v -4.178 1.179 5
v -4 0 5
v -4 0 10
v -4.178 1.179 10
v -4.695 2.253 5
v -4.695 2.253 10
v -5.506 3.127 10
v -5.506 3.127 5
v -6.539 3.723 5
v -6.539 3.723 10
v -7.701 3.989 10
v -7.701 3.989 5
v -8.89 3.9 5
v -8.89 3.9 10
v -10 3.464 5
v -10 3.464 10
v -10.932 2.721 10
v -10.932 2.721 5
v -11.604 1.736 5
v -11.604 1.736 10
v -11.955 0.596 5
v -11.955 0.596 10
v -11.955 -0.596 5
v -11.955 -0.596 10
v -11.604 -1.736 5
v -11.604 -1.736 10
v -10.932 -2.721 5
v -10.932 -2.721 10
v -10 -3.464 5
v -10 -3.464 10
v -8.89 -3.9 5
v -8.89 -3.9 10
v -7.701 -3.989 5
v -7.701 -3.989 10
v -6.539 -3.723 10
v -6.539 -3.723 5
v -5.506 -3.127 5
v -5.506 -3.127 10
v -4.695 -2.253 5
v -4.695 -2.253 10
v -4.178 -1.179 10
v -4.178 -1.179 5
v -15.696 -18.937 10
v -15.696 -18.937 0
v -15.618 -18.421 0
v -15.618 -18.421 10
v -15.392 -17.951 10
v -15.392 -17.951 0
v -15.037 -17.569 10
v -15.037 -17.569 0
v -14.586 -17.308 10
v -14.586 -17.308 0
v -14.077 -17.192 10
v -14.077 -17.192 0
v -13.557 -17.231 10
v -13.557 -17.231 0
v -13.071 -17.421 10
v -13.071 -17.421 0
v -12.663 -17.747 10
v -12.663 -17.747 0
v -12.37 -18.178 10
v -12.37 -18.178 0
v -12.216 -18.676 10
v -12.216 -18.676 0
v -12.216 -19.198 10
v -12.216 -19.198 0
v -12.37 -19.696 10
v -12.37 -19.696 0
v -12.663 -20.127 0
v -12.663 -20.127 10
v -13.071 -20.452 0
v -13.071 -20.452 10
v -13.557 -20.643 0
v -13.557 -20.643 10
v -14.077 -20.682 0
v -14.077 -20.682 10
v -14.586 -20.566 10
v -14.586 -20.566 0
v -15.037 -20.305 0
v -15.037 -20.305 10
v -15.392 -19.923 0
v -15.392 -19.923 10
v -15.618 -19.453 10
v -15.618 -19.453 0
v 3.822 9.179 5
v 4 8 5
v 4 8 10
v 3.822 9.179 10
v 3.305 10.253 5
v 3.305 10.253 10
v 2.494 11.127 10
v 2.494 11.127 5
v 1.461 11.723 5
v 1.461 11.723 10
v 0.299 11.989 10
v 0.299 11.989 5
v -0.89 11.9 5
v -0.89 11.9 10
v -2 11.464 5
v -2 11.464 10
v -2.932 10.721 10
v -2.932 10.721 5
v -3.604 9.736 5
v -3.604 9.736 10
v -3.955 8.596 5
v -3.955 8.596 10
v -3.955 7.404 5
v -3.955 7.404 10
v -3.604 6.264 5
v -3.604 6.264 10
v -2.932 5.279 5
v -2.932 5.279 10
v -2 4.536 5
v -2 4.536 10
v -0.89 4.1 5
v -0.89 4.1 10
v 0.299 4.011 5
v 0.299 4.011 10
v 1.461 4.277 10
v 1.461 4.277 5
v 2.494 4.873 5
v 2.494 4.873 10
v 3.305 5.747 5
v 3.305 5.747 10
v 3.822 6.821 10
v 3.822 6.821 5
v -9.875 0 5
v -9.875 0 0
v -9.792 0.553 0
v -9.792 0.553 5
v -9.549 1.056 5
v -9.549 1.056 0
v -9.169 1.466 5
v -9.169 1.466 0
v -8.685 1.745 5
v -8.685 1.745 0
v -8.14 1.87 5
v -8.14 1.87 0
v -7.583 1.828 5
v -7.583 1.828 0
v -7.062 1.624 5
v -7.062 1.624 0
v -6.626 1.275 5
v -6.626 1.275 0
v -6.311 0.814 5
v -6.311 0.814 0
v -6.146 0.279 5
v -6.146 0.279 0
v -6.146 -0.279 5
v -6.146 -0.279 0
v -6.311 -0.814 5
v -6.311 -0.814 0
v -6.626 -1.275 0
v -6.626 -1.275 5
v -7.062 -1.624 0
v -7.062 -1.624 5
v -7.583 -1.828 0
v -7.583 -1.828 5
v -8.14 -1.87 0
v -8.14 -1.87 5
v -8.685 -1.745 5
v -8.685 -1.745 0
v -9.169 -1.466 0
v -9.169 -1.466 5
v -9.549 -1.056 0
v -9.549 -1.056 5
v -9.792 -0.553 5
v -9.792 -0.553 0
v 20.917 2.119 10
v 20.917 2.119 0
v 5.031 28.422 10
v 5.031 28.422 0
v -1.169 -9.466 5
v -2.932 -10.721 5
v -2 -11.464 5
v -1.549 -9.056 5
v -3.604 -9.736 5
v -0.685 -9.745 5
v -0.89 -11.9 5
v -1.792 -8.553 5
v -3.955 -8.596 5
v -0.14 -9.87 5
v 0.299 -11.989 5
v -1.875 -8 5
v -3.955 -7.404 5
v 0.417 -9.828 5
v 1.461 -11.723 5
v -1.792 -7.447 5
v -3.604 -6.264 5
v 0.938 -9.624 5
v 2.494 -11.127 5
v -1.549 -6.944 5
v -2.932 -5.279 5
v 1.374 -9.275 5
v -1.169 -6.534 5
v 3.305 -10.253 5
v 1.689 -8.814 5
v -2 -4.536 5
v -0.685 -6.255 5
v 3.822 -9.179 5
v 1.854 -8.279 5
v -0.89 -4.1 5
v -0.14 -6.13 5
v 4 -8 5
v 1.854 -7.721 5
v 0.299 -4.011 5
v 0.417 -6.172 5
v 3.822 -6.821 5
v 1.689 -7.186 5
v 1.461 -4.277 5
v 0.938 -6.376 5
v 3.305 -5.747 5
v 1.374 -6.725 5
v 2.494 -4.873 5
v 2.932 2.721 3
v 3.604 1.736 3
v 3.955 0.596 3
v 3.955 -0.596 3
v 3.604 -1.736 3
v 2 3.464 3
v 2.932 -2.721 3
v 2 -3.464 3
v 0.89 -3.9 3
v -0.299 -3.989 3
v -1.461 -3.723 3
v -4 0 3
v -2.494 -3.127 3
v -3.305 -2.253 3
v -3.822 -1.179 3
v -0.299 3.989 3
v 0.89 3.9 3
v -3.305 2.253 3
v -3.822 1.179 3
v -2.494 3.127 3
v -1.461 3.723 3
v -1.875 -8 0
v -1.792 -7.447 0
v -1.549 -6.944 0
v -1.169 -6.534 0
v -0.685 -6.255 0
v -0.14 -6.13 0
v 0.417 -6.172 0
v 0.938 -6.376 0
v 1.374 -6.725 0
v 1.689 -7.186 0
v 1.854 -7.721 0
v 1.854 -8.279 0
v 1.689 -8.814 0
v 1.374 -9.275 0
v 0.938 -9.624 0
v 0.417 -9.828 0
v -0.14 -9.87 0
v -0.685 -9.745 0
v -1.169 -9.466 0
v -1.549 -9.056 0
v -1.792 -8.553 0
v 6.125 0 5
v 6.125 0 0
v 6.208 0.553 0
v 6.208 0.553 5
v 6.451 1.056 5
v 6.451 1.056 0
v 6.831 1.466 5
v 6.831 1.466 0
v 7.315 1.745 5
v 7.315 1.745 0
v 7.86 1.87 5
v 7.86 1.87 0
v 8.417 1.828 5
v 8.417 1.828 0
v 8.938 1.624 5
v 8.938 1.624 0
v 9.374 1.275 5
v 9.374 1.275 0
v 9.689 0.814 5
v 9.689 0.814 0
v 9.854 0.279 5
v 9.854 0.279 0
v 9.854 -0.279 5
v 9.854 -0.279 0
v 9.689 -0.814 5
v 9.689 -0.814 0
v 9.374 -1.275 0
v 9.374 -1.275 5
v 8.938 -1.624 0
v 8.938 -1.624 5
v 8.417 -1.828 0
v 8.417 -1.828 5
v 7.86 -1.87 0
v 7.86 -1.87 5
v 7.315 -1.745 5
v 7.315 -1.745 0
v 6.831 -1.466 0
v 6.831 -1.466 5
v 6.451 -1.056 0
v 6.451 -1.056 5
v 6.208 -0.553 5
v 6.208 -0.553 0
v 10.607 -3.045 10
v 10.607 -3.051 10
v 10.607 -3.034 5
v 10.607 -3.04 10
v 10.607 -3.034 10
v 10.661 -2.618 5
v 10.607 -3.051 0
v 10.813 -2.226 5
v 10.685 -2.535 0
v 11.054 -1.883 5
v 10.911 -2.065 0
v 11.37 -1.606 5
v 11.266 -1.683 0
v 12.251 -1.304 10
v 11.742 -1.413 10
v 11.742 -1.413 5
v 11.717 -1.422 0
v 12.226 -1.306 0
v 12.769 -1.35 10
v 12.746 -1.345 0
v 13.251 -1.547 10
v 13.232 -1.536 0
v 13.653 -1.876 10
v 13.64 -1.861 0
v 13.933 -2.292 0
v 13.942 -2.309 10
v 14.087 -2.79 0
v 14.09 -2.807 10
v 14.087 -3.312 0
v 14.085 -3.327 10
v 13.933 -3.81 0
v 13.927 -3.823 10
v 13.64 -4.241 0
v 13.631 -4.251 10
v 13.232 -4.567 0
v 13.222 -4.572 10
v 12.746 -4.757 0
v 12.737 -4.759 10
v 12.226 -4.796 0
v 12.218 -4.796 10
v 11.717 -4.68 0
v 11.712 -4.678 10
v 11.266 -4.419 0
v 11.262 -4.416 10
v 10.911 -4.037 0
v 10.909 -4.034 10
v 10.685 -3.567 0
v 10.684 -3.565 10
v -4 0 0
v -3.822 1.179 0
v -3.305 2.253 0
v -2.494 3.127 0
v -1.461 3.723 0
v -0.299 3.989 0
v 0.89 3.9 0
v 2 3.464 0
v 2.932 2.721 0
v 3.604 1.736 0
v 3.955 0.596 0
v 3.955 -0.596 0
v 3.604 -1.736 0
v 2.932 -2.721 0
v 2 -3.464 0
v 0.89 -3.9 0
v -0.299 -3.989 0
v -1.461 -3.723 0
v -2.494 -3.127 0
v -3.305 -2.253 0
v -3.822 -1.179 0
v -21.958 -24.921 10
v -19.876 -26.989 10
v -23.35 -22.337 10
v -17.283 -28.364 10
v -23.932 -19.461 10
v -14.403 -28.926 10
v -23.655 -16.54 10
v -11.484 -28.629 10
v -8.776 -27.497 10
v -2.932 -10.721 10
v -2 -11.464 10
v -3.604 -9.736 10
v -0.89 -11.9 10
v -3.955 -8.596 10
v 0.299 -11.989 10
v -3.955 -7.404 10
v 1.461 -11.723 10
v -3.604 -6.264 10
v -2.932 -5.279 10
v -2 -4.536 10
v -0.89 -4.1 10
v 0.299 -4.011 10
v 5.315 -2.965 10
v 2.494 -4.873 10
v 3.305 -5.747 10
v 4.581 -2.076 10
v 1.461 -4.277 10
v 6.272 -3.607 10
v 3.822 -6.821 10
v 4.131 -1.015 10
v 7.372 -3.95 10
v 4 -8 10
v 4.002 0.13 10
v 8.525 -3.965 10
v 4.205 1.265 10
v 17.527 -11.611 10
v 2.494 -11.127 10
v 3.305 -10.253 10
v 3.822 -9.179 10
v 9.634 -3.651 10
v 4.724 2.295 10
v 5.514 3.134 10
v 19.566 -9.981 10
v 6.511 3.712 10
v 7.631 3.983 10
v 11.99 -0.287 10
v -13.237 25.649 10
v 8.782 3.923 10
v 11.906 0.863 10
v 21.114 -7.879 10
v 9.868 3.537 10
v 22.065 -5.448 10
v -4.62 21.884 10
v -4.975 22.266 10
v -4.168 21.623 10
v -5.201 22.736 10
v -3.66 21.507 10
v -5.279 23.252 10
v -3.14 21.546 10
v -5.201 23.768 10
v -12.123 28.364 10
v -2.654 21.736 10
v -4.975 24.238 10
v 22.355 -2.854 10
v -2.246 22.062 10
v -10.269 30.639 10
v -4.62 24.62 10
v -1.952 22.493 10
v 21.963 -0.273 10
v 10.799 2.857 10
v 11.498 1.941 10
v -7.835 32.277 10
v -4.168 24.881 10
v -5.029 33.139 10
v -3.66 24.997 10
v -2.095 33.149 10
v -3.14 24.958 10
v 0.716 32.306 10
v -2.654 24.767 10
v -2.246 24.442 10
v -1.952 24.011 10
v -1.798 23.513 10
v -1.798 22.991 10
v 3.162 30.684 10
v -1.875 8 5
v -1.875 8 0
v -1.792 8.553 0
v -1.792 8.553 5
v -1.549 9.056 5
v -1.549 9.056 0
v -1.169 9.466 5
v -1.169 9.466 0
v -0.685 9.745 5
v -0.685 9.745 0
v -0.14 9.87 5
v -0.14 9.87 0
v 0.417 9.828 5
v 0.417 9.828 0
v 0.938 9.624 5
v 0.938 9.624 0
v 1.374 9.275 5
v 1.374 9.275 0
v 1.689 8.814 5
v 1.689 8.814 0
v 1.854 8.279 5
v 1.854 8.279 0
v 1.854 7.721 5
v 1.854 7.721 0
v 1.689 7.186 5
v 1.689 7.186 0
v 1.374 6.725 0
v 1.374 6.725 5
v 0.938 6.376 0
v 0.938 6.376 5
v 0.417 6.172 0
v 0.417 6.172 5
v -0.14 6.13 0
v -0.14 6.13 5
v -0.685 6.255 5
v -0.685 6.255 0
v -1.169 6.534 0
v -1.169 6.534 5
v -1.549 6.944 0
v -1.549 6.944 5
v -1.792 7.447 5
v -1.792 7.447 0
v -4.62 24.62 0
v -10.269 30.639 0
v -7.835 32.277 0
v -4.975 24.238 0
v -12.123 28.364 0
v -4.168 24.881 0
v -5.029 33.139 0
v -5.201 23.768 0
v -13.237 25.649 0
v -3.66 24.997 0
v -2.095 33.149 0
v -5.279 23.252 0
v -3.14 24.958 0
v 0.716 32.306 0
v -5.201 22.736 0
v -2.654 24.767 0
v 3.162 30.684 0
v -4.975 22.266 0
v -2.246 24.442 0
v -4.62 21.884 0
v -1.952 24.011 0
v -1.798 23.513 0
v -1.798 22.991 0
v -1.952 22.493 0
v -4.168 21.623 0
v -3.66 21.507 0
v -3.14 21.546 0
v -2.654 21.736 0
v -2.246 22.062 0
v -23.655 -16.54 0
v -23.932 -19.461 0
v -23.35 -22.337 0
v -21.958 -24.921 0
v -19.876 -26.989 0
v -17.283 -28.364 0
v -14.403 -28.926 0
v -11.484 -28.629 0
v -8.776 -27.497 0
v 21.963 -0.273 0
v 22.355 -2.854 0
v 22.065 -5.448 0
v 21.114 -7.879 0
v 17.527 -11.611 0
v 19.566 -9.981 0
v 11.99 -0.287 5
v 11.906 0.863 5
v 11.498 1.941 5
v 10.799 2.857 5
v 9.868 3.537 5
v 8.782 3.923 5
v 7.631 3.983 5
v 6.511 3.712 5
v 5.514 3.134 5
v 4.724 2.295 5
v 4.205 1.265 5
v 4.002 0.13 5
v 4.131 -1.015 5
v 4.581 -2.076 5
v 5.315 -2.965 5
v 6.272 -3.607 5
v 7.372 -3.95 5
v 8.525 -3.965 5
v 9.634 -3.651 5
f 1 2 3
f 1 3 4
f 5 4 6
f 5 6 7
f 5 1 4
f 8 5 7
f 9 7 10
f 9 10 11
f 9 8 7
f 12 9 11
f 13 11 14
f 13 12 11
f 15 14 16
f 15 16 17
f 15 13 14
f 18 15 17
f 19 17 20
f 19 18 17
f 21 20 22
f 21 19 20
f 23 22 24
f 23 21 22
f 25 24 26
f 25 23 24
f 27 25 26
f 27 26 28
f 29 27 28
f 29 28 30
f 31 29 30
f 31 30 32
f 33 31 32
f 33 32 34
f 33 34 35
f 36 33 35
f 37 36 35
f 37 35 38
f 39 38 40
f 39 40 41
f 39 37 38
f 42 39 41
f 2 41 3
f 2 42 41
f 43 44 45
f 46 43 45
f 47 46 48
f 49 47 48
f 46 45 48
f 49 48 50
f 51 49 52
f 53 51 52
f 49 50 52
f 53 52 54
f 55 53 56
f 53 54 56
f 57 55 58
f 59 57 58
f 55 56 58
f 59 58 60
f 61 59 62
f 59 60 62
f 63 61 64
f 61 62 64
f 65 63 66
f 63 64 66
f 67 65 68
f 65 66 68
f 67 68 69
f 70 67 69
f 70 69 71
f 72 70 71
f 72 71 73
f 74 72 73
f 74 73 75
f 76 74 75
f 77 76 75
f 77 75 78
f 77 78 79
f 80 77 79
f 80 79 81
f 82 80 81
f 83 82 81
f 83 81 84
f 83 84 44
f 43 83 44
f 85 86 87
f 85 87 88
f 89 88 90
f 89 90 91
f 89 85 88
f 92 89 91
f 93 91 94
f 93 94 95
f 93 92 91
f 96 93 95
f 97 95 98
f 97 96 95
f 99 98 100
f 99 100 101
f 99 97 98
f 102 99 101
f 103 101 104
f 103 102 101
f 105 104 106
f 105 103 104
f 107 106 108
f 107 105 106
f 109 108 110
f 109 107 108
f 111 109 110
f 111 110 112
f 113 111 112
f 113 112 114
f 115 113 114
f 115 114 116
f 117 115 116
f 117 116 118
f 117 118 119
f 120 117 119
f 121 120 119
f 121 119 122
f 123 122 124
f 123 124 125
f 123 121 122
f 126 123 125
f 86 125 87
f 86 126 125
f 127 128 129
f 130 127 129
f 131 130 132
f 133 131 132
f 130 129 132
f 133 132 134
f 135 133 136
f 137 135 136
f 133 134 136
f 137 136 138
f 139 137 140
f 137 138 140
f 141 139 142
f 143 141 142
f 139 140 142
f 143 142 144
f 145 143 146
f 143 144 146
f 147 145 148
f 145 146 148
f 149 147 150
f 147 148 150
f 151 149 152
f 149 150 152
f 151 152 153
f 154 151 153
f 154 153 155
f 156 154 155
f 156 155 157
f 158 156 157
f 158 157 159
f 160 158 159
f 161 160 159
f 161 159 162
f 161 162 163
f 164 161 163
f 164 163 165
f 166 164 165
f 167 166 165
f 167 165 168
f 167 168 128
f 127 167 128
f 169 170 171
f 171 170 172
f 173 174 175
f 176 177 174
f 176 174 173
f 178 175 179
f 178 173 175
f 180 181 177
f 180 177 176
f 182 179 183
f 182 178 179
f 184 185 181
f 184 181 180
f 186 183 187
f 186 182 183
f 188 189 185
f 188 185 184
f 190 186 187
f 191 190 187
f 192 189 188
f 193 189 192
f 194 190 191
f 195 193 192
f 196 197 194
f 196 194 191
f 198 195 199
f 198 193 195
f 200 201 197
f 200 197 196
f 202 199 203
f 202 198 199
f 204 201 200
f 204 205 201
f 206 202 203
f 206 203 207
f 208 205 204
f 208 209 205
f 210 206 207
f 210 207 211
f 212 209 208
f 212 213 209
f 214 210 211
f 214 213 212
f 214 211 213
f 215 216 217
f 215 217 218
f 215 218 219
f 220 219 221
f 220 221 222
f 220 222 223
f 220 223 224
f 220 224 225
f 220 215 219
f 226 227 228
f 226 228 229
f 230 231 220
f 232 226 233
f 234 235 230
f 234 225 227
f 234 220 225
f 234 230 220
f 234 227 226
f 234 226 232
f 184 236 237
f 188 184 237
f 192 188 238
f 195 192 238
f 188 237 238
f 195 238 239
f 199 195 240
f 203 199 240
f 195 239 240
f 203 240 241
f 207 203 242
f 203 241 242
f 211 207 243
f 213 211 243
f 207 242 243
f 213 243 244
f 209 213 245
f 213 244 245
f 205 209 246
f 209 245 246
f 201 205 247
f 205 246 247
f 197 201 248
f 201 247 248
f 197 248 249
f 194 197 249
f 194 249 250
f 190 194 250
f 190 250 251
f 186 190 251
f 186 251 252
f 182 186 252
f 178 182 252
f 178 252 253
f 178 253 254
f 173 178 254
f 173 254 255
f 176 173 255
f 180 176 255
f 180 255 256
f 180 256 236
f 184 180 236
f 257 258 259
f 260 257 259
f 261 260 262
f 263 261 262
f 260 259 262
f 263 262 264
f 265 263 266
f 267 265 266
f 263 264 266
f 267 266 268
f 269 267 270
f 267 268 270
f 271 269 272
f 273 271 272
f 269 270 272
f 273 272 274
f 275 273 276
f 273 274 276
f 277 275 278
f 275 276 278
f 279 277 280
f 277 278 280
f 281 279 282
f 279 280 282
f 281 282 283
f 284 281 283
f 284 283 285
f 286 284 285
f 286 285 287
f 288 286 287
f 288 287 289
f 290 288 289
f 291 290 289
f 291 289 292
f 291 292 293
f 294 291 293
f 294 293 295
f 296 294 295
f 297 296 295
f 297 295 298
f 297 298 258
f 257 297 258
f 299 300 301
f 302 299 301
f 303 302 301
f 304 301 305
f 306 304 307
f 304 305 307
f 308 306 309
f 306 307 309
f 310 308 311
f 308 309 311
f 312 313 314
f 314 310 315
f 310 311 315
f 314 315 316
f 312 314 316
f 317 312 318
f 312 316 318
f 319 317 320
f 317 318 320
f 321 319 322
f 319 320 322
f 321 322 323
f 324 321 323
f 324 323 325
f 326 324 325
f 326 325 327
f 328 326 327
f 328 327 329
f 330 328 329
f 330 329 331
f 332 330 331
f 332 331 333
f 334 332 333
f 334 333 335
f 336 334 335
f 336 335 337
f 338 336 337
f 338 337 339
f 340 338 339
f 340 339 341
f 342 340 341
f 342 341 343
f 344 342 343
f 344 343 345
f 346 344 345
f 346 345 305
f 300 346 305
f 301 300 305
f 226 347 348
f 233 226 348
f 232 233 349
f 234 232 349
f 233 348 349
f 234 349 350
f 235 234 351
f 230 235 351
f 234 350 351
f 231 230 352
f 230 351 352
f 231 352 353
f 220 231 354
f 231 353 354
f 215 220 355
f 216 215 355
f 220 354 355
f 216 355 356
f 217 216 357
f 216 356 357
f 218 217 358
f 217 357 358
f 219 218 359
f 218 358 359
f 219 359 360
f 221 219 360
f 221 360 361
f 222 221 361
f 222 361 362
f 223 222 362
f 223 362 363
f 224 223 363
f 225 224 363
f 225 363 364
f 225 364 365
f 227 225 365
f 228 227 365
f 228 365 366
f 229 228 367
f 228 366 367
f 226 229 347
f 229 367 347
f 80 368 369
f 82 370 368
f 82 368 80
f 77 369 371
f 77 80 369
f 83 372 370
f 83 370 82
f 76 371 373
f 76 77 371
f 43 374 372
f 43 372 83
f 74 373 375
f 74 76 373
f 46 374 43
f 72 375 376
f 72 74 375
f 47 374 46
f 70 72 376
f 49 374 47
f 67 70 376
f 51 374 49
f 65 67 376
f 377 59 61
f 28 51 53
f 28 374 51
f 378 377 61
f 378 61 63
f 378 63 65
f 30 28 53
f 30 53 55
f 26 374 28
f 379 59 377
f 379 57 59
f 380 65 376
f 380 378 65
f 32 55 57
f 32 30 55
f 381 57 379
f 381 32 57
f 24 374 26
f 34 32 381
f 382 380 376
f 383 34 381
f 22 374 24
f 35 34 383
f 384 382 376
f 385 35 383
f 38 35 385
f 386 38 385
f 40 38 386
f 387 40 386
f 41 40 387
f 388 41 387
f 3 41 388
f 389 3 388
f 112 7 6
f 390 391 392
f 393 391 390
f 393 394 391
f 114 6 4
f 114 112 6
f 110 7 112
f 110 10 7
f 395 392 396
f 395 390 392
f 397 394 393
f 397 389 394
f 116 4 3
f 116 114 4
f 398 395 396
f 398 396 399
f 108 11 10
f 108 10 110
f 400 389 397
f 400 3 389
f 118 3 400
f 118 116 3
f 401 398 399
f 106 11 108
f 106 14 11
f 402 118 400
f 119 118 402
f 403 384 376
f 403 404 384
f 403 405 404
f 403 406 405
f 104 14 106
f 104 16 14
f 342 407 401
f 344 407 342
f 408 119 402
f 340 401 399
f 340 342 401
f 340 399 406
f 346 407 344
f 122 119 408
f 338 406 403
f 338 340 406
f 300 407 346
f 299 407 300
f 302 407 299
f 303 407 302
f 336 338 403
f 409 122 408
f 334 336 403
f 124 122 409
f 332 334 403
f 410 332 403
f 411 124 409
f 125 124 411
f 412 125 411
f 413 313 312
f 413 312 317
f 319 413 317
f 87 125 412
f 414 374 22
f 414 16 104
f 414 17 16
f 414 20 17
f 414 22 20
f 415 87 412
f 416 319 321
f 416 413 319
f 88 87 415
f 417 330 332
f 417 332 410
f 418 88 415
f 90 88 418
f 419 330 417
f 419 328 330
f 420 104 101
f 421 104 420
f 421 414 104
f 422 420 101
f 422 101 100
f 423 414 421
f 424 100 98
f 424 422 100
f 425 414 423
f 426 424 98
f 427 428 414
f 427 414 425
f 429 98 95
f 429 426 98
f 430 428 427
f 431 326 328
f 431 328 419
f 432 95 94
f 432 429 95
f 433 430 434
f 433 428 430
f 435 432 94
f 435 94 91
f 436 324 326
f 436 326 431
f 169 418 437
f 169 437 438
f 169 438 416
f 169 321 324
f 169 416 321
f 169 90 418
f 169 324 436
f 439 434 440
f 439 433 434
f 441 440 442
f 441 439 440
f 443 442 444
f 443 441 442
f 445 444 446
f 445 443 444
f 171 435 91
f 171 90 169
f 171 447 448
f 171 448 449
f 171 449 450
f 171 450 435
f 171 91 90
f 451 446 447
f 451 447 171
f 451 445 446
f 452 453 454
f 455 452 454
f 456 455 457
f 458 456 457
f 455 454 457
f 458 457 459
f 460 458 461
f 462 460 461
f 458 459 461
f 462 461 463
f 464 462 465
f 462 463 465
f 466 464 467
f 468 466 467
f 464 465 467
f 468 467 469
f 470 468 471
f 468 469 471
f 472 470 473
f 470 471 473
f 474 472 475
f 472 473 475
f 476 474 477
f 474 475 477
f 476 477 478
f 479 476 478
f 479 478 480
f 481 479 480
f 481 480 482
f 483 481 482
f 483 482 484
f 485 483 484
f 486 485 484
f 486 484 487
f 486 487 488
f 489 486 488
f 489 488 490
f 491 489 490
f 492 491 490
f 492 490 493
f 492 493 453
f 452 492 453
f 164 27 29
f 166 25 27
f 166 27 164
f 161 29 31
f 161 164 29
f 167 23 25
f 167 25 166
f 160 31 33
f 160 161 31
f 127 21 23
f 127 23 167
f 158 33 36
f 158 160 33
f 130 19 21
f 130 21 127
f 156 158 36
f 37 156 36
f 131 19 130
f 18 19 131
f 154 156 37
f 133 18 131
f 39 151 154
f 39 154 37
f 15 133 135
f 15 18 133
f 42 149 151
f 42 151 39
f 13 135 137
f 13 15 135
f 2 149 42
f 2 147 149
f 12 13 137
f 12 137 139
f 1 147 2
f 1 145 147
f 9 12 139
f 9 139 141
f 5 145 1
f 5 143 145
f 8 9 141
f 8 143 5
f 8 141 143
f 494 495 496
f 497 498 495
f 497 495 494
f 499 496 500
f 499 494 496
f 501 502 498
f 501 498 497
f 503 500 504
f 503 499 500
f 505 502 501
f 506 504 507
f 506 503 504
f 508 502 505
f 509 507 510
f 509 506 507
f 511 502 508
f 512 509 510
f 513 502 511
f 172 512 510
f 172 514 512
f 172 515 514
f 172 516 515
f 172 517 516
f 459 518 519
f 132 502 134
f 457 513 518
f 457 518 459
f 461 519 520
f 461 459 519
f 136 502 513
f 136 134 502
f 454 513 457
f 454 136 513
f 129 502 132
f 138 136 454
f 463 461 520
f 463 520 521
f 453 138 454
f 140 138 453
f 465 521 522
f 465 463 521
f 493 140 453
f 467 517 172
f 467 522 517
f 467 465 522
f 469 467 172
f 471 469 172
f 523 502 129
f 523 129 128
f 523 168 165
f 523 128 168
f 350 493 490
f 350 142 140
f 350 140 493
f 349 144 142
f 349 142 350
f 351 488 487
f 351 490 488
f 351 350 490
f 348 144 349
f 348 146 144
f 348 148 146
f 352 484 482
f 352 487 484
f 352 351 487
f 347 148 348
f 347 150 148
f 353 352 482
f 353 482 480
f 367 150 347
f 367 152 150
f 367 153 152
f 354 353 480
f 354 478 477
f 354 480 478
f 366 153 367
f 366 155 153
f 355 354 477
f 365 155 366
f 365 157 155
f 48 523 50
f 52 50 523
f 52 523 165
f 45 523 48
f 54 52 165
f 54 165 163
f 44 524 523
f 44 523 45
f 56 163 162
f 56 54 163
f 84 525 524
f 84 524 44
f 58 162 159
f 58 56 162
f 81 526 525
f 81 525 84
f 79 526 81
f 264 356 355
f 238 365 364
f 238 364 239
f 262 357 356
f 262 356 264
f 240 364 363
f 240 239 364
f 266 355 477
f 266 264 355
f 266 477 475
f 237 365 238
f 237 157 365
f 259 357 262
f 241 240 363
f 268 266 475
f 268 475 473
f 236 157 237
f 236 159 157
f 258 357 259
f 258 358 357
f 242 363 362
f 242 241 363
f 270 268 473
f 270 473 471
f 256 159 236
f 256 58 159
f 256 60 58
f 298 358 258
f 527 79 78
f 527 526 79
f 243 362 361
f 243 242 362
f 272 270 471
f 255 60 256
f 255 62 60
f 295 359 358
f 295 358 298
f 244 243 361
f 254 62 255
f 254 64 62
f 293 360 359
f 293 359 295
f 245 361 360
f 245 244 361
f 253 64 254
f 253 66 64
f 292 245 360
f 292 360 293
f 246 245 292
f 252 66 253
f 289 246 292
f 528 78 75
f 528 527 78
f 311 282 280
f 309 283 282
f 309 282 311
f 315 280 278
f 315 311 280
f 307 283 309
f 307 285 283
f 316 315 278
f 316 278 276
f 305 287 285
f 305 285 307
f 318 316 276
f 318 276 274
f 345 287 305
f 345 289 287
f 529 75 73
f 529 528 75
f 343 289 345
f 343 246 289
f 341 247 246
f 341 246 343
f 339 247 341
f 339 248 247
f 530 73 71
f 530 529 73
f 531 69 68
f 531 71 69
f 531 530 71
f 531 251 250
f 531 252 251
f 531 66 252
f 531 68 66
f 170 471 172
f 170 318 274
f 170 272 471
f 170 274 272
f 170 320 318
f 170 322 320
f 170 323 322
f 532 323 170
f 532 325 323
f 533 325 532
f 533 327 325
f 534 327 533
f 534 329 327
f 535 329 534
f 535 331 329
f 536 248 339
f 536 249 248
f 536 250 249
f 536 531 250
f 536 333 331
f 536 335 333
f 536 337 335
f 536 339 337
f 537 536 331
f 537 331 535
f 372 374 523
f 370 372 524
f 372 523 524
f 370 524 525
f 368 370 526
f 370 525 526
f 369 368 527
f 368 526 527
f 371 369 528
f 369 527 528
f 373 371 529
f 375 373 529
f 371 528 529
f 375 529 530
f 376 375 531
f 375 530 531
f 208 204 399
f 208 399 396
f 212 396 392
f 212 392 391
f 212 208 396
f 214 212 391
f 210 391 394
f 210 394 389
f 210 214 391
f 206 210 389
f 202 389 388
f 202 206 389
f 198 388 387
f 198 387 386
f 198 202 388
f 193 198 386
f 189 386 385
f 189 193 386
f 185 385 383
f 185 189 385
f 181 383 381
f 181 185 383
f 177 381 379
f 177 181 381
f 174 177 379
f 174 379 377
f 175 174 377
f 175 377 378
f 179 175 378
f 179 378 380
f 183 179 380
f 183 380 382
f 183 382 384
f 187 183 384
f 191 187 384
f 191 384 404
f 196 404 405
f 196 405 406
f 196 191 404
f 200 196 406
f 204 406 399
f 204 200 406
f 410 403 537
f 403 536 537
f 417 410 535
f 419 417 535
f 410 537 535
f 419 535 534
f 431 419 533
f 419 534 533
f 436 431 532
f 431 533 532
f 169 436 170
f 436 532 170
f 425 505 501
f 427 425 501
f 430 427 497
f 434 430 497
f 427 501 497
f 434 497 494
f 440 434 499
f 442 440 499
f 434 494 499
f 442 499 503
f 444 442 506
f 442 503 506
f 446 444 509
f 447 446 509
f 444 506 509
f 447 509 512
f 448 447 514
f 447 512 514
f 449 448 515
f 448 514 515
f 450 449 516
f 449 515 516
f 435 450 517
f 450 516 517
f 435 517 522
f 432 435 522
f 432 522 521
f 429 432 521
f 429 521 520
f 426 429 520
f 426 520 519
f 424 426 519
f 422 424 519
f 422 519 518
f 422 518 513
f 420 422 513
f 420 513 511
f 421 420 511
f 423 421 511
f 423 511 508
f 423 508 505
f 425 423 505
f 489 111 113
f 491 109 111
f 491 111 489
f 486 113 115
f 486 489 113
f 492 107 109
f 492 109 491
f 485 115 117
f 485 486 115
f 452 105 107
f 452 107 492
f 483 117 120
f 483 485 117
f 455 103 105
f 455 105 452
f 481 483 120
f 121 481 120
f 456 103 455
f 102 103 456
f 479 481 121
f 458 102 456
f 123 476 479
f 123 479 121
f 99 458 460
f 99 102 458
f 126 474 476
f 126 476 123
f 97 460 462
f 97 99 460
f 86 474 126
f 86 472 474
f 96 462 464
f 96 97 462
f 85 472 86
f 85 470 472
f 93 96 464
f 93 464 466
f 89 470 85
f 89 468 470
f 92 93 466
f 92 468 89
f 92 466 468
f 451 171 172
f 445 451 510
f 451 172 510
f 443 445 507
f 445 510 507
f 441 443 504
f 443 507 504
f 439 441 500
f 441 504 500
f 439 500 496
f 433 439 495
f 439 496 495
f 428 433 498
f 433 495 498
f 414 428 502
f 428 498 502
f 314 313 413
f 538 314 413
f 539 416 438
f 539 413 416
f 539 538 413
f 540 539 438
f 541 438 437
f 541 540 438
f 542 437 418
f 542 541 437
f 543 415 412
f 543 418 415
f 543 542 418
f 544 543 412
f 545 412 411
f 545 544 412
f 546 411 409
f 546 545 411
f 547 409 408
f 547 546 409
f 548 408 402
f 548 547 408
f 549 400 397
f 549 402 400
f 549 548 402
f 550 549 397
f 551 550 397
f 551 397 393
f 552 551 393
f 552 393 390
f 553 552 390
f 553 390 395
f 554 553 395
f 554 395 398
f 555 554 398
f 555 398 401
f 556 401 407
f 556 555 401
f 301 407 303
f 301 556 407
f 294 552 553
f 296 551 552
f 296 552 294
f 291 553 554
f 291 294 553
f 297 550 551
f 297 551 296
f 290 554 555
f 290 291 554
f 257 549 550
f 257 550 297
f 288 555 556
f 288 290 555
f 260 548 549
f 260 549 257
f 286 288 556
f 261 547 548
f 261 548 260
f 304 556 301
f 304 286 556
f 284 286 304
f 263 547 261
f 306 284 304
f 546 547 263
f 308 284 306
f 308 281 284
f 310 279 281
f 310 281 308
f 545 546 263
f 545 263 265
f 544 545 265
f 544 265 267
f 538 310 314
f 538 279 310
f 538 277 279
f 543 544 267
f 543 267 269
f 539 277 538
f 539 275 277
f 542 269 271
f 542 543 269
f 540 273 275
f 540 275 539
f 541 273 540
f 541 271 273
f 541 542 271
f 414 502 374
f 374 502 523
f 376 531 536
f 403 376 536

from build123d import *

# Parameters (mm, degrees)
SKETCH1_R               = 9
BOSS_EXTRUDE1_DEPTH     = 70
SKETCH2_R               = 2.5
CUT_EXTRUDE1_DEPTH      = 5
CUT_EXTRUDE2_REACH      = 90.987
CUT_EXTRUDE2_END_RADIUS = 9
SKETCH3_R               = 1.75
CIRPATTERN1_COUNT       = 3
SKETCH5_W               = 24.568161226
SKETCH5_H               = 25
SKETCH6_R               = 9
BOSS_EXTRUDE2_DEPTH     = 5
SKETCH8_R               = 9
SKETCH8_R_2             = 5.0505014
BOSS_EXTRUDE3_DEPTH     = 3
CUT_EXTRUDE3_REACH      = 83.112
SKETCH9_R               = 1.875
SKETCH11_R              = 4
CUT_EXTRUDE4_DEPTH      = 3
CUT_EXTRUDE5_DEPTH      = 82.111701173
CUT_EXTRUDE5_DEPTH_BACK = 82.111701173
SKETCH12_W              = 69.923732777
SKETCH12_H              = 71.865657343
SKETCH13_R              = 4
BOSS_EXTRUDE5_DEPTH     = 5
SKETCH14_R              = 1.75
CUT_EXTRUDE6_DEPTH      = 43.17947431


with BuildPart() as part:
    # Sketch1 → Boss-Extrude1 (new body)
    with BuildSketch(Plane.XY):
        with BuildLine():
            Line((-23.6546385, -16.539669722), (-13.23734813, 25.649078182))
            ThreePointArc((-13.23734813, 25.649078182), (-5.029445343, 33.138647287), (5.031042671, 28.421667909))
            Line((5.031042671, 28.421667909), (20.916771438, 2.118648772))
            ThreePointArc((20.916771438, 2.118648772), (22.065215706, -5.448366461), (17.526600651, -11.611126974))
            Line((17.526600651, -11.611126974), (-8.776418486, -27.496855741))
            ThreePointArc((-8.776418486, -27.496855741), (-19.876207308, -26.988917124), (-23.6546385, -16.539669722))
        make_face()
        Circle(SKETCH1_R, mode=Mode.SUBTRACT)
    extrude(amount=BOSS_EXTRUDE1_DEPTH)

    # Sketch2 → Cut-Extrude1 (cut)
    with BuildSketch(Plane(origin=(9.822624711, -16.263949206, 0), x_dir=(0.8559973266359324, 0.5169802479709809, 0), z_dir=(0.5169802479709809, -0.8559973266359324, 0))):
        with Locations((0, 65)):
            Circle(SKETCH2_R)
    cut_extrude1 = extrude(amount=-CUT_EXTRUDE1_DEPTH, mode=Mode.SUBTRACT)

    # Cut-Extrude2: up to this cylinder (the profile starts outside it)
    cut_extrude2_end = Plane(origin=(0, 0, 65), z_dir=(0, 0, -1)) * Cylinder(CUT_EXTRUDE2_END_RADIUS, 200.974, mode=Mode.PRIVATE)
    # Sketch3 → Cut-Extrude2 (cut, up to the surface)
    with BuildSketch(Plane(origin=(7.237723472, -11.983962573, 0), x_dir=(0.8559973266359324, 0.5169802479709809, 0), z_dir=(0.5169802479709809, -0.8559973266359324, 0)), mode=Mode.PRIVATE) as cut_extrude2_sk1:
        with Locations((0, 65)):
            Circle(SKETCH3_R)
    cut_extrude2_tool1 = extrude(cut_extrude2_sk1.sketch, amount=-CUT_EXTRUDE2_REACH, mode=Mode.PRIVATE) - cut_extrude2_end
    cut_extrude2 = cut_extrude2_tool1.solids().sort_by_distance((7.237723, -11.983963, 65))[0]
    add(cut_extrude2, mode=Mode.SUBTRACT)

    # CirPattern1: Cut-Extrude1, Cut-Extrude2 ×3 about axis
    cirpattern1_axis = Axis((0, 0, 0), (0, 0, 1))
    add([cut_extrude1.rotate(cirpattern1_axis, i * 360 / CIRPATTERN1_COUNT) for i in range(1, CIRPATTERN1_COUNT)], mode=Mode.SUBTRACT)
    add([cut_extrude2.rotate(cirpattern1_axis, i * 360 / CIRPATTERN1_COUNT) for i in range(1, CIRPATTERN1_COUNT)], mode=Mode.SUBTRACT)

    # Sketch5 → Cut-Revolve1 (revolve, cut)
    with BuildSketch(Plane(origin=(0, 0, 0), x_dir=(1, 0, 0), z_dir=(0, 1, 0)), mode=Mode.PRIVATE) as cut_revolve1_sk:
        with Locations((-12.284080613, -17.5)):
            Rectangle(SKETCH5_W, SKETCH5_H)
    revolve(cut_revolve1_sk.sketch.rotate(Axis((0, 0, 0), (0, 0, 1)), 180), axis=Axis((0, 0, 0), (0, 0, 1)), mode=Mode.SUBTRACT)

    # Sketch6 → Boss-Extrude2 (add)
    with BuildSketch(Plane(origin=(0, 0, 0), x_dir=(-1, 0, 0), z_dir=(0, 0, -1))):
        with Locations(Location((0, 0, 0), (0, 0, 180))):
            Circle(SKETCH6_R)
    extrude(amount=-BOSS_EXTRUDE2_DEPTH)

    # Sketch8 → Boss-Extrude3 (add)
    with BuildSketch(Plane(origin=(0, 0, 30), x_dir=(-1, 0, 0), z_dir=(0, 0, -1))):
        Circle(SKETCH8_R)
        Circle(SKETCH8_R_2, mode=Mode.SUBTRACT)
    extrude(amount=-BOSS_EXTRUDE3_DEPTH)

    # Sketch9 → Cut-Extrude3 (cut, up to next)
    with BuildSketch(Plane(origin=(0, 0, 0), x_dir=(-1, 0, 0), z_dir=(0, 0, -1)), mode=Mode.PRIVATE) as cut_extrude3_sk1:
        with Locations((0, 8)):
            Circle(SKETCH9_R)
    cut_extrude3_tool1 = extrude(cut_extrude3_sk1.sketch, amount=-CUT_EXTRUDE3_REACH, mode=Mode.PRIVATE) & part.part
    # Sketch9 → Cut-Extrude3 (cut, up to next)
    with BuildSketch(Plane(origin=(0, 0, 0), x_dir=(-1, 0, 0), z_dir=(0, 0, -1)), mode=Mode.PRIVATE) as cut_extrude3_sk2:
        with Locations((8, 0)):
            Circle(SKETCH9_R)
    cut_extrude3_tool2 = extrude(cut_extrude3_sk2.sketch, amount=-CUT_EXTRUDE3_REACH, mode=Mode.PRIVATE) & part.part
    # Sketch9 → Cut-Extrude3 (cut, up to next)
    with BuildSketch(Plane(origin=(0, 0, 0), x_dir=(-1, 0, 0), z_dir=(0, 0, -1)), mode=Mode.PRIVATE) as cut_extrude3_sk3:
        with Locations((0, -8)):
            Circle(SKETCH9_R)
    cut_extrude3_tool3 = extrude(cut_extrude3_sk3.sketch, amount=-CUT_EXTRUDE3_REACH, mode=Mode.PRIVATE) & part.part
    # Sketch9 → Cut-Extrude3 (cut, up to next)
    with BuildSketch(Plane(origin=(0, 0, 0), x_dir=(-1, 0, 0), z_dir=(0, 0, -1)), mode=Mode.PRIVATE) as cut_extrude3_sk4:
        with Locations((-8, 0)):
            Circle(SKETCH9_R)
    cut_extrude3_tool4 = extrude(cut_extrude3_sk4.sketch, amount=-CUT_EXTRUDE3_REACH, mode=Mode.PRIVATE) & part.part
    add(cut_extrude3_tool1.solids().sort_by_distance((0, 8, 0))[0], mode=Mode.SUBTRACT)
    add(cut_extrude3_tool2.solids().sort_by_distance((-8, 0, 0))[0], mode=Mode.SUBTRACT)
    add(cut_extrude3_tool3.solids().sort_by_distance((0, -8, 0))[0], mode=Mode.SUBTRACT)
    add(cut_extrude3_tool4.solids().sort_by_distance((8, 0, 0))[0], mode=Mode.SUBTRACT)

    # Sketch11 → Cut-Extrude4 (cut)
    with BuildSketch(Plane(origin=(0, 0, 0), x_dir=(-1, 0, 0), z_dir=(0, 0, -1))):
        Circle(SKETCH11_R)
    extrude(amount=-CUT_EXTRUDE4_DEPTH, mode=Mode.SUBTRACT)

    # Sketch12 → Cut-Extrude5 (cut, two sides: drawn at the far end of the back side and taken through both)
    with BuildSketch(Plane(origin=(0, 0, 0), x_dir=(0, 0, -1), z_dir=(1, 0, 0)).offset(-CUT_EXTRUDE5_DEPTH_BACK)):
        with Locations((-39.961866388, -0.358209869)):
            Rectangle(SKETCH12_W, SKETCH12_H)
    extrude(amount=CUT_EXTRUDE5_DEPTH + CUT_EXTRUDE5_DEPTH_BACK, mode=Mode.SUBTRACT)

    # Sketch13 → Boss-Extrude5 (add)
    with BuildSketch(Plane.XY.offset(5)):
        with BuildLine():
            Line((-8.776418486, -27.496855741), (17.526600651, -11.611126974))
            ThreePointArc((17.526600651, -11.611126974), (22.065215706, -5.448366461), (20.916771438, 2.118648772))
            Line((20.916771438, 2.118648772), (5.031042671, 28.421667909))
            ThreePointArc((5.031042671, 28.421667909), (-5.029445343, 33.138647287), (-13.23734813, 25.649078182))
            Line((-13.23734813, 25.649078182), (-23.6546385, -16.539669722))
            ThreePointArc((-23.6546385, -16.539669722), (-19.876207308, -26.988917124), (-8.776418486, -27.496855741))
        make_face()
        with Locations((-8, 0)):
            Circle(SKETCH13_R, mode=Mode.SUBTRACT)
        with Locations((0, 8)):
            Circle(SKETCH13_R, mode=Mode.SUBTRACT)
        with Locations((8, 0)):
            Circle(SKETCH13_R, mode=Mode.SUBTRACT)
        with Locations((0, -8)):
            Circle(SKETCH13_R, mode=Mode.SUBTRACT)
    extrude(amount=BOSS_EXTRUDE5_DEPTH)

    # Sketch14 → Cut-Extrude6 (cut, through all)
    with BuildSketch(Plane(origin=(0, 0, 0), x_dir=(-1, 0, 0), z_dir=(0, 0, -1))):
        with Locations((3.528930595, 23.25186543)):
            Circle(SKETCH14_R)
        with Locations((-12.356798171, -3.051153708)):
            Circle(SKETCH14_R)
        with Locations((13.946220966, -18.936882475)):
            Circle(SKETCH14_R)
    extrude(amount=-CUT_EXTRUDE6_DEPTH, mode=Mode.SUBTRACT)


solid = part.part
